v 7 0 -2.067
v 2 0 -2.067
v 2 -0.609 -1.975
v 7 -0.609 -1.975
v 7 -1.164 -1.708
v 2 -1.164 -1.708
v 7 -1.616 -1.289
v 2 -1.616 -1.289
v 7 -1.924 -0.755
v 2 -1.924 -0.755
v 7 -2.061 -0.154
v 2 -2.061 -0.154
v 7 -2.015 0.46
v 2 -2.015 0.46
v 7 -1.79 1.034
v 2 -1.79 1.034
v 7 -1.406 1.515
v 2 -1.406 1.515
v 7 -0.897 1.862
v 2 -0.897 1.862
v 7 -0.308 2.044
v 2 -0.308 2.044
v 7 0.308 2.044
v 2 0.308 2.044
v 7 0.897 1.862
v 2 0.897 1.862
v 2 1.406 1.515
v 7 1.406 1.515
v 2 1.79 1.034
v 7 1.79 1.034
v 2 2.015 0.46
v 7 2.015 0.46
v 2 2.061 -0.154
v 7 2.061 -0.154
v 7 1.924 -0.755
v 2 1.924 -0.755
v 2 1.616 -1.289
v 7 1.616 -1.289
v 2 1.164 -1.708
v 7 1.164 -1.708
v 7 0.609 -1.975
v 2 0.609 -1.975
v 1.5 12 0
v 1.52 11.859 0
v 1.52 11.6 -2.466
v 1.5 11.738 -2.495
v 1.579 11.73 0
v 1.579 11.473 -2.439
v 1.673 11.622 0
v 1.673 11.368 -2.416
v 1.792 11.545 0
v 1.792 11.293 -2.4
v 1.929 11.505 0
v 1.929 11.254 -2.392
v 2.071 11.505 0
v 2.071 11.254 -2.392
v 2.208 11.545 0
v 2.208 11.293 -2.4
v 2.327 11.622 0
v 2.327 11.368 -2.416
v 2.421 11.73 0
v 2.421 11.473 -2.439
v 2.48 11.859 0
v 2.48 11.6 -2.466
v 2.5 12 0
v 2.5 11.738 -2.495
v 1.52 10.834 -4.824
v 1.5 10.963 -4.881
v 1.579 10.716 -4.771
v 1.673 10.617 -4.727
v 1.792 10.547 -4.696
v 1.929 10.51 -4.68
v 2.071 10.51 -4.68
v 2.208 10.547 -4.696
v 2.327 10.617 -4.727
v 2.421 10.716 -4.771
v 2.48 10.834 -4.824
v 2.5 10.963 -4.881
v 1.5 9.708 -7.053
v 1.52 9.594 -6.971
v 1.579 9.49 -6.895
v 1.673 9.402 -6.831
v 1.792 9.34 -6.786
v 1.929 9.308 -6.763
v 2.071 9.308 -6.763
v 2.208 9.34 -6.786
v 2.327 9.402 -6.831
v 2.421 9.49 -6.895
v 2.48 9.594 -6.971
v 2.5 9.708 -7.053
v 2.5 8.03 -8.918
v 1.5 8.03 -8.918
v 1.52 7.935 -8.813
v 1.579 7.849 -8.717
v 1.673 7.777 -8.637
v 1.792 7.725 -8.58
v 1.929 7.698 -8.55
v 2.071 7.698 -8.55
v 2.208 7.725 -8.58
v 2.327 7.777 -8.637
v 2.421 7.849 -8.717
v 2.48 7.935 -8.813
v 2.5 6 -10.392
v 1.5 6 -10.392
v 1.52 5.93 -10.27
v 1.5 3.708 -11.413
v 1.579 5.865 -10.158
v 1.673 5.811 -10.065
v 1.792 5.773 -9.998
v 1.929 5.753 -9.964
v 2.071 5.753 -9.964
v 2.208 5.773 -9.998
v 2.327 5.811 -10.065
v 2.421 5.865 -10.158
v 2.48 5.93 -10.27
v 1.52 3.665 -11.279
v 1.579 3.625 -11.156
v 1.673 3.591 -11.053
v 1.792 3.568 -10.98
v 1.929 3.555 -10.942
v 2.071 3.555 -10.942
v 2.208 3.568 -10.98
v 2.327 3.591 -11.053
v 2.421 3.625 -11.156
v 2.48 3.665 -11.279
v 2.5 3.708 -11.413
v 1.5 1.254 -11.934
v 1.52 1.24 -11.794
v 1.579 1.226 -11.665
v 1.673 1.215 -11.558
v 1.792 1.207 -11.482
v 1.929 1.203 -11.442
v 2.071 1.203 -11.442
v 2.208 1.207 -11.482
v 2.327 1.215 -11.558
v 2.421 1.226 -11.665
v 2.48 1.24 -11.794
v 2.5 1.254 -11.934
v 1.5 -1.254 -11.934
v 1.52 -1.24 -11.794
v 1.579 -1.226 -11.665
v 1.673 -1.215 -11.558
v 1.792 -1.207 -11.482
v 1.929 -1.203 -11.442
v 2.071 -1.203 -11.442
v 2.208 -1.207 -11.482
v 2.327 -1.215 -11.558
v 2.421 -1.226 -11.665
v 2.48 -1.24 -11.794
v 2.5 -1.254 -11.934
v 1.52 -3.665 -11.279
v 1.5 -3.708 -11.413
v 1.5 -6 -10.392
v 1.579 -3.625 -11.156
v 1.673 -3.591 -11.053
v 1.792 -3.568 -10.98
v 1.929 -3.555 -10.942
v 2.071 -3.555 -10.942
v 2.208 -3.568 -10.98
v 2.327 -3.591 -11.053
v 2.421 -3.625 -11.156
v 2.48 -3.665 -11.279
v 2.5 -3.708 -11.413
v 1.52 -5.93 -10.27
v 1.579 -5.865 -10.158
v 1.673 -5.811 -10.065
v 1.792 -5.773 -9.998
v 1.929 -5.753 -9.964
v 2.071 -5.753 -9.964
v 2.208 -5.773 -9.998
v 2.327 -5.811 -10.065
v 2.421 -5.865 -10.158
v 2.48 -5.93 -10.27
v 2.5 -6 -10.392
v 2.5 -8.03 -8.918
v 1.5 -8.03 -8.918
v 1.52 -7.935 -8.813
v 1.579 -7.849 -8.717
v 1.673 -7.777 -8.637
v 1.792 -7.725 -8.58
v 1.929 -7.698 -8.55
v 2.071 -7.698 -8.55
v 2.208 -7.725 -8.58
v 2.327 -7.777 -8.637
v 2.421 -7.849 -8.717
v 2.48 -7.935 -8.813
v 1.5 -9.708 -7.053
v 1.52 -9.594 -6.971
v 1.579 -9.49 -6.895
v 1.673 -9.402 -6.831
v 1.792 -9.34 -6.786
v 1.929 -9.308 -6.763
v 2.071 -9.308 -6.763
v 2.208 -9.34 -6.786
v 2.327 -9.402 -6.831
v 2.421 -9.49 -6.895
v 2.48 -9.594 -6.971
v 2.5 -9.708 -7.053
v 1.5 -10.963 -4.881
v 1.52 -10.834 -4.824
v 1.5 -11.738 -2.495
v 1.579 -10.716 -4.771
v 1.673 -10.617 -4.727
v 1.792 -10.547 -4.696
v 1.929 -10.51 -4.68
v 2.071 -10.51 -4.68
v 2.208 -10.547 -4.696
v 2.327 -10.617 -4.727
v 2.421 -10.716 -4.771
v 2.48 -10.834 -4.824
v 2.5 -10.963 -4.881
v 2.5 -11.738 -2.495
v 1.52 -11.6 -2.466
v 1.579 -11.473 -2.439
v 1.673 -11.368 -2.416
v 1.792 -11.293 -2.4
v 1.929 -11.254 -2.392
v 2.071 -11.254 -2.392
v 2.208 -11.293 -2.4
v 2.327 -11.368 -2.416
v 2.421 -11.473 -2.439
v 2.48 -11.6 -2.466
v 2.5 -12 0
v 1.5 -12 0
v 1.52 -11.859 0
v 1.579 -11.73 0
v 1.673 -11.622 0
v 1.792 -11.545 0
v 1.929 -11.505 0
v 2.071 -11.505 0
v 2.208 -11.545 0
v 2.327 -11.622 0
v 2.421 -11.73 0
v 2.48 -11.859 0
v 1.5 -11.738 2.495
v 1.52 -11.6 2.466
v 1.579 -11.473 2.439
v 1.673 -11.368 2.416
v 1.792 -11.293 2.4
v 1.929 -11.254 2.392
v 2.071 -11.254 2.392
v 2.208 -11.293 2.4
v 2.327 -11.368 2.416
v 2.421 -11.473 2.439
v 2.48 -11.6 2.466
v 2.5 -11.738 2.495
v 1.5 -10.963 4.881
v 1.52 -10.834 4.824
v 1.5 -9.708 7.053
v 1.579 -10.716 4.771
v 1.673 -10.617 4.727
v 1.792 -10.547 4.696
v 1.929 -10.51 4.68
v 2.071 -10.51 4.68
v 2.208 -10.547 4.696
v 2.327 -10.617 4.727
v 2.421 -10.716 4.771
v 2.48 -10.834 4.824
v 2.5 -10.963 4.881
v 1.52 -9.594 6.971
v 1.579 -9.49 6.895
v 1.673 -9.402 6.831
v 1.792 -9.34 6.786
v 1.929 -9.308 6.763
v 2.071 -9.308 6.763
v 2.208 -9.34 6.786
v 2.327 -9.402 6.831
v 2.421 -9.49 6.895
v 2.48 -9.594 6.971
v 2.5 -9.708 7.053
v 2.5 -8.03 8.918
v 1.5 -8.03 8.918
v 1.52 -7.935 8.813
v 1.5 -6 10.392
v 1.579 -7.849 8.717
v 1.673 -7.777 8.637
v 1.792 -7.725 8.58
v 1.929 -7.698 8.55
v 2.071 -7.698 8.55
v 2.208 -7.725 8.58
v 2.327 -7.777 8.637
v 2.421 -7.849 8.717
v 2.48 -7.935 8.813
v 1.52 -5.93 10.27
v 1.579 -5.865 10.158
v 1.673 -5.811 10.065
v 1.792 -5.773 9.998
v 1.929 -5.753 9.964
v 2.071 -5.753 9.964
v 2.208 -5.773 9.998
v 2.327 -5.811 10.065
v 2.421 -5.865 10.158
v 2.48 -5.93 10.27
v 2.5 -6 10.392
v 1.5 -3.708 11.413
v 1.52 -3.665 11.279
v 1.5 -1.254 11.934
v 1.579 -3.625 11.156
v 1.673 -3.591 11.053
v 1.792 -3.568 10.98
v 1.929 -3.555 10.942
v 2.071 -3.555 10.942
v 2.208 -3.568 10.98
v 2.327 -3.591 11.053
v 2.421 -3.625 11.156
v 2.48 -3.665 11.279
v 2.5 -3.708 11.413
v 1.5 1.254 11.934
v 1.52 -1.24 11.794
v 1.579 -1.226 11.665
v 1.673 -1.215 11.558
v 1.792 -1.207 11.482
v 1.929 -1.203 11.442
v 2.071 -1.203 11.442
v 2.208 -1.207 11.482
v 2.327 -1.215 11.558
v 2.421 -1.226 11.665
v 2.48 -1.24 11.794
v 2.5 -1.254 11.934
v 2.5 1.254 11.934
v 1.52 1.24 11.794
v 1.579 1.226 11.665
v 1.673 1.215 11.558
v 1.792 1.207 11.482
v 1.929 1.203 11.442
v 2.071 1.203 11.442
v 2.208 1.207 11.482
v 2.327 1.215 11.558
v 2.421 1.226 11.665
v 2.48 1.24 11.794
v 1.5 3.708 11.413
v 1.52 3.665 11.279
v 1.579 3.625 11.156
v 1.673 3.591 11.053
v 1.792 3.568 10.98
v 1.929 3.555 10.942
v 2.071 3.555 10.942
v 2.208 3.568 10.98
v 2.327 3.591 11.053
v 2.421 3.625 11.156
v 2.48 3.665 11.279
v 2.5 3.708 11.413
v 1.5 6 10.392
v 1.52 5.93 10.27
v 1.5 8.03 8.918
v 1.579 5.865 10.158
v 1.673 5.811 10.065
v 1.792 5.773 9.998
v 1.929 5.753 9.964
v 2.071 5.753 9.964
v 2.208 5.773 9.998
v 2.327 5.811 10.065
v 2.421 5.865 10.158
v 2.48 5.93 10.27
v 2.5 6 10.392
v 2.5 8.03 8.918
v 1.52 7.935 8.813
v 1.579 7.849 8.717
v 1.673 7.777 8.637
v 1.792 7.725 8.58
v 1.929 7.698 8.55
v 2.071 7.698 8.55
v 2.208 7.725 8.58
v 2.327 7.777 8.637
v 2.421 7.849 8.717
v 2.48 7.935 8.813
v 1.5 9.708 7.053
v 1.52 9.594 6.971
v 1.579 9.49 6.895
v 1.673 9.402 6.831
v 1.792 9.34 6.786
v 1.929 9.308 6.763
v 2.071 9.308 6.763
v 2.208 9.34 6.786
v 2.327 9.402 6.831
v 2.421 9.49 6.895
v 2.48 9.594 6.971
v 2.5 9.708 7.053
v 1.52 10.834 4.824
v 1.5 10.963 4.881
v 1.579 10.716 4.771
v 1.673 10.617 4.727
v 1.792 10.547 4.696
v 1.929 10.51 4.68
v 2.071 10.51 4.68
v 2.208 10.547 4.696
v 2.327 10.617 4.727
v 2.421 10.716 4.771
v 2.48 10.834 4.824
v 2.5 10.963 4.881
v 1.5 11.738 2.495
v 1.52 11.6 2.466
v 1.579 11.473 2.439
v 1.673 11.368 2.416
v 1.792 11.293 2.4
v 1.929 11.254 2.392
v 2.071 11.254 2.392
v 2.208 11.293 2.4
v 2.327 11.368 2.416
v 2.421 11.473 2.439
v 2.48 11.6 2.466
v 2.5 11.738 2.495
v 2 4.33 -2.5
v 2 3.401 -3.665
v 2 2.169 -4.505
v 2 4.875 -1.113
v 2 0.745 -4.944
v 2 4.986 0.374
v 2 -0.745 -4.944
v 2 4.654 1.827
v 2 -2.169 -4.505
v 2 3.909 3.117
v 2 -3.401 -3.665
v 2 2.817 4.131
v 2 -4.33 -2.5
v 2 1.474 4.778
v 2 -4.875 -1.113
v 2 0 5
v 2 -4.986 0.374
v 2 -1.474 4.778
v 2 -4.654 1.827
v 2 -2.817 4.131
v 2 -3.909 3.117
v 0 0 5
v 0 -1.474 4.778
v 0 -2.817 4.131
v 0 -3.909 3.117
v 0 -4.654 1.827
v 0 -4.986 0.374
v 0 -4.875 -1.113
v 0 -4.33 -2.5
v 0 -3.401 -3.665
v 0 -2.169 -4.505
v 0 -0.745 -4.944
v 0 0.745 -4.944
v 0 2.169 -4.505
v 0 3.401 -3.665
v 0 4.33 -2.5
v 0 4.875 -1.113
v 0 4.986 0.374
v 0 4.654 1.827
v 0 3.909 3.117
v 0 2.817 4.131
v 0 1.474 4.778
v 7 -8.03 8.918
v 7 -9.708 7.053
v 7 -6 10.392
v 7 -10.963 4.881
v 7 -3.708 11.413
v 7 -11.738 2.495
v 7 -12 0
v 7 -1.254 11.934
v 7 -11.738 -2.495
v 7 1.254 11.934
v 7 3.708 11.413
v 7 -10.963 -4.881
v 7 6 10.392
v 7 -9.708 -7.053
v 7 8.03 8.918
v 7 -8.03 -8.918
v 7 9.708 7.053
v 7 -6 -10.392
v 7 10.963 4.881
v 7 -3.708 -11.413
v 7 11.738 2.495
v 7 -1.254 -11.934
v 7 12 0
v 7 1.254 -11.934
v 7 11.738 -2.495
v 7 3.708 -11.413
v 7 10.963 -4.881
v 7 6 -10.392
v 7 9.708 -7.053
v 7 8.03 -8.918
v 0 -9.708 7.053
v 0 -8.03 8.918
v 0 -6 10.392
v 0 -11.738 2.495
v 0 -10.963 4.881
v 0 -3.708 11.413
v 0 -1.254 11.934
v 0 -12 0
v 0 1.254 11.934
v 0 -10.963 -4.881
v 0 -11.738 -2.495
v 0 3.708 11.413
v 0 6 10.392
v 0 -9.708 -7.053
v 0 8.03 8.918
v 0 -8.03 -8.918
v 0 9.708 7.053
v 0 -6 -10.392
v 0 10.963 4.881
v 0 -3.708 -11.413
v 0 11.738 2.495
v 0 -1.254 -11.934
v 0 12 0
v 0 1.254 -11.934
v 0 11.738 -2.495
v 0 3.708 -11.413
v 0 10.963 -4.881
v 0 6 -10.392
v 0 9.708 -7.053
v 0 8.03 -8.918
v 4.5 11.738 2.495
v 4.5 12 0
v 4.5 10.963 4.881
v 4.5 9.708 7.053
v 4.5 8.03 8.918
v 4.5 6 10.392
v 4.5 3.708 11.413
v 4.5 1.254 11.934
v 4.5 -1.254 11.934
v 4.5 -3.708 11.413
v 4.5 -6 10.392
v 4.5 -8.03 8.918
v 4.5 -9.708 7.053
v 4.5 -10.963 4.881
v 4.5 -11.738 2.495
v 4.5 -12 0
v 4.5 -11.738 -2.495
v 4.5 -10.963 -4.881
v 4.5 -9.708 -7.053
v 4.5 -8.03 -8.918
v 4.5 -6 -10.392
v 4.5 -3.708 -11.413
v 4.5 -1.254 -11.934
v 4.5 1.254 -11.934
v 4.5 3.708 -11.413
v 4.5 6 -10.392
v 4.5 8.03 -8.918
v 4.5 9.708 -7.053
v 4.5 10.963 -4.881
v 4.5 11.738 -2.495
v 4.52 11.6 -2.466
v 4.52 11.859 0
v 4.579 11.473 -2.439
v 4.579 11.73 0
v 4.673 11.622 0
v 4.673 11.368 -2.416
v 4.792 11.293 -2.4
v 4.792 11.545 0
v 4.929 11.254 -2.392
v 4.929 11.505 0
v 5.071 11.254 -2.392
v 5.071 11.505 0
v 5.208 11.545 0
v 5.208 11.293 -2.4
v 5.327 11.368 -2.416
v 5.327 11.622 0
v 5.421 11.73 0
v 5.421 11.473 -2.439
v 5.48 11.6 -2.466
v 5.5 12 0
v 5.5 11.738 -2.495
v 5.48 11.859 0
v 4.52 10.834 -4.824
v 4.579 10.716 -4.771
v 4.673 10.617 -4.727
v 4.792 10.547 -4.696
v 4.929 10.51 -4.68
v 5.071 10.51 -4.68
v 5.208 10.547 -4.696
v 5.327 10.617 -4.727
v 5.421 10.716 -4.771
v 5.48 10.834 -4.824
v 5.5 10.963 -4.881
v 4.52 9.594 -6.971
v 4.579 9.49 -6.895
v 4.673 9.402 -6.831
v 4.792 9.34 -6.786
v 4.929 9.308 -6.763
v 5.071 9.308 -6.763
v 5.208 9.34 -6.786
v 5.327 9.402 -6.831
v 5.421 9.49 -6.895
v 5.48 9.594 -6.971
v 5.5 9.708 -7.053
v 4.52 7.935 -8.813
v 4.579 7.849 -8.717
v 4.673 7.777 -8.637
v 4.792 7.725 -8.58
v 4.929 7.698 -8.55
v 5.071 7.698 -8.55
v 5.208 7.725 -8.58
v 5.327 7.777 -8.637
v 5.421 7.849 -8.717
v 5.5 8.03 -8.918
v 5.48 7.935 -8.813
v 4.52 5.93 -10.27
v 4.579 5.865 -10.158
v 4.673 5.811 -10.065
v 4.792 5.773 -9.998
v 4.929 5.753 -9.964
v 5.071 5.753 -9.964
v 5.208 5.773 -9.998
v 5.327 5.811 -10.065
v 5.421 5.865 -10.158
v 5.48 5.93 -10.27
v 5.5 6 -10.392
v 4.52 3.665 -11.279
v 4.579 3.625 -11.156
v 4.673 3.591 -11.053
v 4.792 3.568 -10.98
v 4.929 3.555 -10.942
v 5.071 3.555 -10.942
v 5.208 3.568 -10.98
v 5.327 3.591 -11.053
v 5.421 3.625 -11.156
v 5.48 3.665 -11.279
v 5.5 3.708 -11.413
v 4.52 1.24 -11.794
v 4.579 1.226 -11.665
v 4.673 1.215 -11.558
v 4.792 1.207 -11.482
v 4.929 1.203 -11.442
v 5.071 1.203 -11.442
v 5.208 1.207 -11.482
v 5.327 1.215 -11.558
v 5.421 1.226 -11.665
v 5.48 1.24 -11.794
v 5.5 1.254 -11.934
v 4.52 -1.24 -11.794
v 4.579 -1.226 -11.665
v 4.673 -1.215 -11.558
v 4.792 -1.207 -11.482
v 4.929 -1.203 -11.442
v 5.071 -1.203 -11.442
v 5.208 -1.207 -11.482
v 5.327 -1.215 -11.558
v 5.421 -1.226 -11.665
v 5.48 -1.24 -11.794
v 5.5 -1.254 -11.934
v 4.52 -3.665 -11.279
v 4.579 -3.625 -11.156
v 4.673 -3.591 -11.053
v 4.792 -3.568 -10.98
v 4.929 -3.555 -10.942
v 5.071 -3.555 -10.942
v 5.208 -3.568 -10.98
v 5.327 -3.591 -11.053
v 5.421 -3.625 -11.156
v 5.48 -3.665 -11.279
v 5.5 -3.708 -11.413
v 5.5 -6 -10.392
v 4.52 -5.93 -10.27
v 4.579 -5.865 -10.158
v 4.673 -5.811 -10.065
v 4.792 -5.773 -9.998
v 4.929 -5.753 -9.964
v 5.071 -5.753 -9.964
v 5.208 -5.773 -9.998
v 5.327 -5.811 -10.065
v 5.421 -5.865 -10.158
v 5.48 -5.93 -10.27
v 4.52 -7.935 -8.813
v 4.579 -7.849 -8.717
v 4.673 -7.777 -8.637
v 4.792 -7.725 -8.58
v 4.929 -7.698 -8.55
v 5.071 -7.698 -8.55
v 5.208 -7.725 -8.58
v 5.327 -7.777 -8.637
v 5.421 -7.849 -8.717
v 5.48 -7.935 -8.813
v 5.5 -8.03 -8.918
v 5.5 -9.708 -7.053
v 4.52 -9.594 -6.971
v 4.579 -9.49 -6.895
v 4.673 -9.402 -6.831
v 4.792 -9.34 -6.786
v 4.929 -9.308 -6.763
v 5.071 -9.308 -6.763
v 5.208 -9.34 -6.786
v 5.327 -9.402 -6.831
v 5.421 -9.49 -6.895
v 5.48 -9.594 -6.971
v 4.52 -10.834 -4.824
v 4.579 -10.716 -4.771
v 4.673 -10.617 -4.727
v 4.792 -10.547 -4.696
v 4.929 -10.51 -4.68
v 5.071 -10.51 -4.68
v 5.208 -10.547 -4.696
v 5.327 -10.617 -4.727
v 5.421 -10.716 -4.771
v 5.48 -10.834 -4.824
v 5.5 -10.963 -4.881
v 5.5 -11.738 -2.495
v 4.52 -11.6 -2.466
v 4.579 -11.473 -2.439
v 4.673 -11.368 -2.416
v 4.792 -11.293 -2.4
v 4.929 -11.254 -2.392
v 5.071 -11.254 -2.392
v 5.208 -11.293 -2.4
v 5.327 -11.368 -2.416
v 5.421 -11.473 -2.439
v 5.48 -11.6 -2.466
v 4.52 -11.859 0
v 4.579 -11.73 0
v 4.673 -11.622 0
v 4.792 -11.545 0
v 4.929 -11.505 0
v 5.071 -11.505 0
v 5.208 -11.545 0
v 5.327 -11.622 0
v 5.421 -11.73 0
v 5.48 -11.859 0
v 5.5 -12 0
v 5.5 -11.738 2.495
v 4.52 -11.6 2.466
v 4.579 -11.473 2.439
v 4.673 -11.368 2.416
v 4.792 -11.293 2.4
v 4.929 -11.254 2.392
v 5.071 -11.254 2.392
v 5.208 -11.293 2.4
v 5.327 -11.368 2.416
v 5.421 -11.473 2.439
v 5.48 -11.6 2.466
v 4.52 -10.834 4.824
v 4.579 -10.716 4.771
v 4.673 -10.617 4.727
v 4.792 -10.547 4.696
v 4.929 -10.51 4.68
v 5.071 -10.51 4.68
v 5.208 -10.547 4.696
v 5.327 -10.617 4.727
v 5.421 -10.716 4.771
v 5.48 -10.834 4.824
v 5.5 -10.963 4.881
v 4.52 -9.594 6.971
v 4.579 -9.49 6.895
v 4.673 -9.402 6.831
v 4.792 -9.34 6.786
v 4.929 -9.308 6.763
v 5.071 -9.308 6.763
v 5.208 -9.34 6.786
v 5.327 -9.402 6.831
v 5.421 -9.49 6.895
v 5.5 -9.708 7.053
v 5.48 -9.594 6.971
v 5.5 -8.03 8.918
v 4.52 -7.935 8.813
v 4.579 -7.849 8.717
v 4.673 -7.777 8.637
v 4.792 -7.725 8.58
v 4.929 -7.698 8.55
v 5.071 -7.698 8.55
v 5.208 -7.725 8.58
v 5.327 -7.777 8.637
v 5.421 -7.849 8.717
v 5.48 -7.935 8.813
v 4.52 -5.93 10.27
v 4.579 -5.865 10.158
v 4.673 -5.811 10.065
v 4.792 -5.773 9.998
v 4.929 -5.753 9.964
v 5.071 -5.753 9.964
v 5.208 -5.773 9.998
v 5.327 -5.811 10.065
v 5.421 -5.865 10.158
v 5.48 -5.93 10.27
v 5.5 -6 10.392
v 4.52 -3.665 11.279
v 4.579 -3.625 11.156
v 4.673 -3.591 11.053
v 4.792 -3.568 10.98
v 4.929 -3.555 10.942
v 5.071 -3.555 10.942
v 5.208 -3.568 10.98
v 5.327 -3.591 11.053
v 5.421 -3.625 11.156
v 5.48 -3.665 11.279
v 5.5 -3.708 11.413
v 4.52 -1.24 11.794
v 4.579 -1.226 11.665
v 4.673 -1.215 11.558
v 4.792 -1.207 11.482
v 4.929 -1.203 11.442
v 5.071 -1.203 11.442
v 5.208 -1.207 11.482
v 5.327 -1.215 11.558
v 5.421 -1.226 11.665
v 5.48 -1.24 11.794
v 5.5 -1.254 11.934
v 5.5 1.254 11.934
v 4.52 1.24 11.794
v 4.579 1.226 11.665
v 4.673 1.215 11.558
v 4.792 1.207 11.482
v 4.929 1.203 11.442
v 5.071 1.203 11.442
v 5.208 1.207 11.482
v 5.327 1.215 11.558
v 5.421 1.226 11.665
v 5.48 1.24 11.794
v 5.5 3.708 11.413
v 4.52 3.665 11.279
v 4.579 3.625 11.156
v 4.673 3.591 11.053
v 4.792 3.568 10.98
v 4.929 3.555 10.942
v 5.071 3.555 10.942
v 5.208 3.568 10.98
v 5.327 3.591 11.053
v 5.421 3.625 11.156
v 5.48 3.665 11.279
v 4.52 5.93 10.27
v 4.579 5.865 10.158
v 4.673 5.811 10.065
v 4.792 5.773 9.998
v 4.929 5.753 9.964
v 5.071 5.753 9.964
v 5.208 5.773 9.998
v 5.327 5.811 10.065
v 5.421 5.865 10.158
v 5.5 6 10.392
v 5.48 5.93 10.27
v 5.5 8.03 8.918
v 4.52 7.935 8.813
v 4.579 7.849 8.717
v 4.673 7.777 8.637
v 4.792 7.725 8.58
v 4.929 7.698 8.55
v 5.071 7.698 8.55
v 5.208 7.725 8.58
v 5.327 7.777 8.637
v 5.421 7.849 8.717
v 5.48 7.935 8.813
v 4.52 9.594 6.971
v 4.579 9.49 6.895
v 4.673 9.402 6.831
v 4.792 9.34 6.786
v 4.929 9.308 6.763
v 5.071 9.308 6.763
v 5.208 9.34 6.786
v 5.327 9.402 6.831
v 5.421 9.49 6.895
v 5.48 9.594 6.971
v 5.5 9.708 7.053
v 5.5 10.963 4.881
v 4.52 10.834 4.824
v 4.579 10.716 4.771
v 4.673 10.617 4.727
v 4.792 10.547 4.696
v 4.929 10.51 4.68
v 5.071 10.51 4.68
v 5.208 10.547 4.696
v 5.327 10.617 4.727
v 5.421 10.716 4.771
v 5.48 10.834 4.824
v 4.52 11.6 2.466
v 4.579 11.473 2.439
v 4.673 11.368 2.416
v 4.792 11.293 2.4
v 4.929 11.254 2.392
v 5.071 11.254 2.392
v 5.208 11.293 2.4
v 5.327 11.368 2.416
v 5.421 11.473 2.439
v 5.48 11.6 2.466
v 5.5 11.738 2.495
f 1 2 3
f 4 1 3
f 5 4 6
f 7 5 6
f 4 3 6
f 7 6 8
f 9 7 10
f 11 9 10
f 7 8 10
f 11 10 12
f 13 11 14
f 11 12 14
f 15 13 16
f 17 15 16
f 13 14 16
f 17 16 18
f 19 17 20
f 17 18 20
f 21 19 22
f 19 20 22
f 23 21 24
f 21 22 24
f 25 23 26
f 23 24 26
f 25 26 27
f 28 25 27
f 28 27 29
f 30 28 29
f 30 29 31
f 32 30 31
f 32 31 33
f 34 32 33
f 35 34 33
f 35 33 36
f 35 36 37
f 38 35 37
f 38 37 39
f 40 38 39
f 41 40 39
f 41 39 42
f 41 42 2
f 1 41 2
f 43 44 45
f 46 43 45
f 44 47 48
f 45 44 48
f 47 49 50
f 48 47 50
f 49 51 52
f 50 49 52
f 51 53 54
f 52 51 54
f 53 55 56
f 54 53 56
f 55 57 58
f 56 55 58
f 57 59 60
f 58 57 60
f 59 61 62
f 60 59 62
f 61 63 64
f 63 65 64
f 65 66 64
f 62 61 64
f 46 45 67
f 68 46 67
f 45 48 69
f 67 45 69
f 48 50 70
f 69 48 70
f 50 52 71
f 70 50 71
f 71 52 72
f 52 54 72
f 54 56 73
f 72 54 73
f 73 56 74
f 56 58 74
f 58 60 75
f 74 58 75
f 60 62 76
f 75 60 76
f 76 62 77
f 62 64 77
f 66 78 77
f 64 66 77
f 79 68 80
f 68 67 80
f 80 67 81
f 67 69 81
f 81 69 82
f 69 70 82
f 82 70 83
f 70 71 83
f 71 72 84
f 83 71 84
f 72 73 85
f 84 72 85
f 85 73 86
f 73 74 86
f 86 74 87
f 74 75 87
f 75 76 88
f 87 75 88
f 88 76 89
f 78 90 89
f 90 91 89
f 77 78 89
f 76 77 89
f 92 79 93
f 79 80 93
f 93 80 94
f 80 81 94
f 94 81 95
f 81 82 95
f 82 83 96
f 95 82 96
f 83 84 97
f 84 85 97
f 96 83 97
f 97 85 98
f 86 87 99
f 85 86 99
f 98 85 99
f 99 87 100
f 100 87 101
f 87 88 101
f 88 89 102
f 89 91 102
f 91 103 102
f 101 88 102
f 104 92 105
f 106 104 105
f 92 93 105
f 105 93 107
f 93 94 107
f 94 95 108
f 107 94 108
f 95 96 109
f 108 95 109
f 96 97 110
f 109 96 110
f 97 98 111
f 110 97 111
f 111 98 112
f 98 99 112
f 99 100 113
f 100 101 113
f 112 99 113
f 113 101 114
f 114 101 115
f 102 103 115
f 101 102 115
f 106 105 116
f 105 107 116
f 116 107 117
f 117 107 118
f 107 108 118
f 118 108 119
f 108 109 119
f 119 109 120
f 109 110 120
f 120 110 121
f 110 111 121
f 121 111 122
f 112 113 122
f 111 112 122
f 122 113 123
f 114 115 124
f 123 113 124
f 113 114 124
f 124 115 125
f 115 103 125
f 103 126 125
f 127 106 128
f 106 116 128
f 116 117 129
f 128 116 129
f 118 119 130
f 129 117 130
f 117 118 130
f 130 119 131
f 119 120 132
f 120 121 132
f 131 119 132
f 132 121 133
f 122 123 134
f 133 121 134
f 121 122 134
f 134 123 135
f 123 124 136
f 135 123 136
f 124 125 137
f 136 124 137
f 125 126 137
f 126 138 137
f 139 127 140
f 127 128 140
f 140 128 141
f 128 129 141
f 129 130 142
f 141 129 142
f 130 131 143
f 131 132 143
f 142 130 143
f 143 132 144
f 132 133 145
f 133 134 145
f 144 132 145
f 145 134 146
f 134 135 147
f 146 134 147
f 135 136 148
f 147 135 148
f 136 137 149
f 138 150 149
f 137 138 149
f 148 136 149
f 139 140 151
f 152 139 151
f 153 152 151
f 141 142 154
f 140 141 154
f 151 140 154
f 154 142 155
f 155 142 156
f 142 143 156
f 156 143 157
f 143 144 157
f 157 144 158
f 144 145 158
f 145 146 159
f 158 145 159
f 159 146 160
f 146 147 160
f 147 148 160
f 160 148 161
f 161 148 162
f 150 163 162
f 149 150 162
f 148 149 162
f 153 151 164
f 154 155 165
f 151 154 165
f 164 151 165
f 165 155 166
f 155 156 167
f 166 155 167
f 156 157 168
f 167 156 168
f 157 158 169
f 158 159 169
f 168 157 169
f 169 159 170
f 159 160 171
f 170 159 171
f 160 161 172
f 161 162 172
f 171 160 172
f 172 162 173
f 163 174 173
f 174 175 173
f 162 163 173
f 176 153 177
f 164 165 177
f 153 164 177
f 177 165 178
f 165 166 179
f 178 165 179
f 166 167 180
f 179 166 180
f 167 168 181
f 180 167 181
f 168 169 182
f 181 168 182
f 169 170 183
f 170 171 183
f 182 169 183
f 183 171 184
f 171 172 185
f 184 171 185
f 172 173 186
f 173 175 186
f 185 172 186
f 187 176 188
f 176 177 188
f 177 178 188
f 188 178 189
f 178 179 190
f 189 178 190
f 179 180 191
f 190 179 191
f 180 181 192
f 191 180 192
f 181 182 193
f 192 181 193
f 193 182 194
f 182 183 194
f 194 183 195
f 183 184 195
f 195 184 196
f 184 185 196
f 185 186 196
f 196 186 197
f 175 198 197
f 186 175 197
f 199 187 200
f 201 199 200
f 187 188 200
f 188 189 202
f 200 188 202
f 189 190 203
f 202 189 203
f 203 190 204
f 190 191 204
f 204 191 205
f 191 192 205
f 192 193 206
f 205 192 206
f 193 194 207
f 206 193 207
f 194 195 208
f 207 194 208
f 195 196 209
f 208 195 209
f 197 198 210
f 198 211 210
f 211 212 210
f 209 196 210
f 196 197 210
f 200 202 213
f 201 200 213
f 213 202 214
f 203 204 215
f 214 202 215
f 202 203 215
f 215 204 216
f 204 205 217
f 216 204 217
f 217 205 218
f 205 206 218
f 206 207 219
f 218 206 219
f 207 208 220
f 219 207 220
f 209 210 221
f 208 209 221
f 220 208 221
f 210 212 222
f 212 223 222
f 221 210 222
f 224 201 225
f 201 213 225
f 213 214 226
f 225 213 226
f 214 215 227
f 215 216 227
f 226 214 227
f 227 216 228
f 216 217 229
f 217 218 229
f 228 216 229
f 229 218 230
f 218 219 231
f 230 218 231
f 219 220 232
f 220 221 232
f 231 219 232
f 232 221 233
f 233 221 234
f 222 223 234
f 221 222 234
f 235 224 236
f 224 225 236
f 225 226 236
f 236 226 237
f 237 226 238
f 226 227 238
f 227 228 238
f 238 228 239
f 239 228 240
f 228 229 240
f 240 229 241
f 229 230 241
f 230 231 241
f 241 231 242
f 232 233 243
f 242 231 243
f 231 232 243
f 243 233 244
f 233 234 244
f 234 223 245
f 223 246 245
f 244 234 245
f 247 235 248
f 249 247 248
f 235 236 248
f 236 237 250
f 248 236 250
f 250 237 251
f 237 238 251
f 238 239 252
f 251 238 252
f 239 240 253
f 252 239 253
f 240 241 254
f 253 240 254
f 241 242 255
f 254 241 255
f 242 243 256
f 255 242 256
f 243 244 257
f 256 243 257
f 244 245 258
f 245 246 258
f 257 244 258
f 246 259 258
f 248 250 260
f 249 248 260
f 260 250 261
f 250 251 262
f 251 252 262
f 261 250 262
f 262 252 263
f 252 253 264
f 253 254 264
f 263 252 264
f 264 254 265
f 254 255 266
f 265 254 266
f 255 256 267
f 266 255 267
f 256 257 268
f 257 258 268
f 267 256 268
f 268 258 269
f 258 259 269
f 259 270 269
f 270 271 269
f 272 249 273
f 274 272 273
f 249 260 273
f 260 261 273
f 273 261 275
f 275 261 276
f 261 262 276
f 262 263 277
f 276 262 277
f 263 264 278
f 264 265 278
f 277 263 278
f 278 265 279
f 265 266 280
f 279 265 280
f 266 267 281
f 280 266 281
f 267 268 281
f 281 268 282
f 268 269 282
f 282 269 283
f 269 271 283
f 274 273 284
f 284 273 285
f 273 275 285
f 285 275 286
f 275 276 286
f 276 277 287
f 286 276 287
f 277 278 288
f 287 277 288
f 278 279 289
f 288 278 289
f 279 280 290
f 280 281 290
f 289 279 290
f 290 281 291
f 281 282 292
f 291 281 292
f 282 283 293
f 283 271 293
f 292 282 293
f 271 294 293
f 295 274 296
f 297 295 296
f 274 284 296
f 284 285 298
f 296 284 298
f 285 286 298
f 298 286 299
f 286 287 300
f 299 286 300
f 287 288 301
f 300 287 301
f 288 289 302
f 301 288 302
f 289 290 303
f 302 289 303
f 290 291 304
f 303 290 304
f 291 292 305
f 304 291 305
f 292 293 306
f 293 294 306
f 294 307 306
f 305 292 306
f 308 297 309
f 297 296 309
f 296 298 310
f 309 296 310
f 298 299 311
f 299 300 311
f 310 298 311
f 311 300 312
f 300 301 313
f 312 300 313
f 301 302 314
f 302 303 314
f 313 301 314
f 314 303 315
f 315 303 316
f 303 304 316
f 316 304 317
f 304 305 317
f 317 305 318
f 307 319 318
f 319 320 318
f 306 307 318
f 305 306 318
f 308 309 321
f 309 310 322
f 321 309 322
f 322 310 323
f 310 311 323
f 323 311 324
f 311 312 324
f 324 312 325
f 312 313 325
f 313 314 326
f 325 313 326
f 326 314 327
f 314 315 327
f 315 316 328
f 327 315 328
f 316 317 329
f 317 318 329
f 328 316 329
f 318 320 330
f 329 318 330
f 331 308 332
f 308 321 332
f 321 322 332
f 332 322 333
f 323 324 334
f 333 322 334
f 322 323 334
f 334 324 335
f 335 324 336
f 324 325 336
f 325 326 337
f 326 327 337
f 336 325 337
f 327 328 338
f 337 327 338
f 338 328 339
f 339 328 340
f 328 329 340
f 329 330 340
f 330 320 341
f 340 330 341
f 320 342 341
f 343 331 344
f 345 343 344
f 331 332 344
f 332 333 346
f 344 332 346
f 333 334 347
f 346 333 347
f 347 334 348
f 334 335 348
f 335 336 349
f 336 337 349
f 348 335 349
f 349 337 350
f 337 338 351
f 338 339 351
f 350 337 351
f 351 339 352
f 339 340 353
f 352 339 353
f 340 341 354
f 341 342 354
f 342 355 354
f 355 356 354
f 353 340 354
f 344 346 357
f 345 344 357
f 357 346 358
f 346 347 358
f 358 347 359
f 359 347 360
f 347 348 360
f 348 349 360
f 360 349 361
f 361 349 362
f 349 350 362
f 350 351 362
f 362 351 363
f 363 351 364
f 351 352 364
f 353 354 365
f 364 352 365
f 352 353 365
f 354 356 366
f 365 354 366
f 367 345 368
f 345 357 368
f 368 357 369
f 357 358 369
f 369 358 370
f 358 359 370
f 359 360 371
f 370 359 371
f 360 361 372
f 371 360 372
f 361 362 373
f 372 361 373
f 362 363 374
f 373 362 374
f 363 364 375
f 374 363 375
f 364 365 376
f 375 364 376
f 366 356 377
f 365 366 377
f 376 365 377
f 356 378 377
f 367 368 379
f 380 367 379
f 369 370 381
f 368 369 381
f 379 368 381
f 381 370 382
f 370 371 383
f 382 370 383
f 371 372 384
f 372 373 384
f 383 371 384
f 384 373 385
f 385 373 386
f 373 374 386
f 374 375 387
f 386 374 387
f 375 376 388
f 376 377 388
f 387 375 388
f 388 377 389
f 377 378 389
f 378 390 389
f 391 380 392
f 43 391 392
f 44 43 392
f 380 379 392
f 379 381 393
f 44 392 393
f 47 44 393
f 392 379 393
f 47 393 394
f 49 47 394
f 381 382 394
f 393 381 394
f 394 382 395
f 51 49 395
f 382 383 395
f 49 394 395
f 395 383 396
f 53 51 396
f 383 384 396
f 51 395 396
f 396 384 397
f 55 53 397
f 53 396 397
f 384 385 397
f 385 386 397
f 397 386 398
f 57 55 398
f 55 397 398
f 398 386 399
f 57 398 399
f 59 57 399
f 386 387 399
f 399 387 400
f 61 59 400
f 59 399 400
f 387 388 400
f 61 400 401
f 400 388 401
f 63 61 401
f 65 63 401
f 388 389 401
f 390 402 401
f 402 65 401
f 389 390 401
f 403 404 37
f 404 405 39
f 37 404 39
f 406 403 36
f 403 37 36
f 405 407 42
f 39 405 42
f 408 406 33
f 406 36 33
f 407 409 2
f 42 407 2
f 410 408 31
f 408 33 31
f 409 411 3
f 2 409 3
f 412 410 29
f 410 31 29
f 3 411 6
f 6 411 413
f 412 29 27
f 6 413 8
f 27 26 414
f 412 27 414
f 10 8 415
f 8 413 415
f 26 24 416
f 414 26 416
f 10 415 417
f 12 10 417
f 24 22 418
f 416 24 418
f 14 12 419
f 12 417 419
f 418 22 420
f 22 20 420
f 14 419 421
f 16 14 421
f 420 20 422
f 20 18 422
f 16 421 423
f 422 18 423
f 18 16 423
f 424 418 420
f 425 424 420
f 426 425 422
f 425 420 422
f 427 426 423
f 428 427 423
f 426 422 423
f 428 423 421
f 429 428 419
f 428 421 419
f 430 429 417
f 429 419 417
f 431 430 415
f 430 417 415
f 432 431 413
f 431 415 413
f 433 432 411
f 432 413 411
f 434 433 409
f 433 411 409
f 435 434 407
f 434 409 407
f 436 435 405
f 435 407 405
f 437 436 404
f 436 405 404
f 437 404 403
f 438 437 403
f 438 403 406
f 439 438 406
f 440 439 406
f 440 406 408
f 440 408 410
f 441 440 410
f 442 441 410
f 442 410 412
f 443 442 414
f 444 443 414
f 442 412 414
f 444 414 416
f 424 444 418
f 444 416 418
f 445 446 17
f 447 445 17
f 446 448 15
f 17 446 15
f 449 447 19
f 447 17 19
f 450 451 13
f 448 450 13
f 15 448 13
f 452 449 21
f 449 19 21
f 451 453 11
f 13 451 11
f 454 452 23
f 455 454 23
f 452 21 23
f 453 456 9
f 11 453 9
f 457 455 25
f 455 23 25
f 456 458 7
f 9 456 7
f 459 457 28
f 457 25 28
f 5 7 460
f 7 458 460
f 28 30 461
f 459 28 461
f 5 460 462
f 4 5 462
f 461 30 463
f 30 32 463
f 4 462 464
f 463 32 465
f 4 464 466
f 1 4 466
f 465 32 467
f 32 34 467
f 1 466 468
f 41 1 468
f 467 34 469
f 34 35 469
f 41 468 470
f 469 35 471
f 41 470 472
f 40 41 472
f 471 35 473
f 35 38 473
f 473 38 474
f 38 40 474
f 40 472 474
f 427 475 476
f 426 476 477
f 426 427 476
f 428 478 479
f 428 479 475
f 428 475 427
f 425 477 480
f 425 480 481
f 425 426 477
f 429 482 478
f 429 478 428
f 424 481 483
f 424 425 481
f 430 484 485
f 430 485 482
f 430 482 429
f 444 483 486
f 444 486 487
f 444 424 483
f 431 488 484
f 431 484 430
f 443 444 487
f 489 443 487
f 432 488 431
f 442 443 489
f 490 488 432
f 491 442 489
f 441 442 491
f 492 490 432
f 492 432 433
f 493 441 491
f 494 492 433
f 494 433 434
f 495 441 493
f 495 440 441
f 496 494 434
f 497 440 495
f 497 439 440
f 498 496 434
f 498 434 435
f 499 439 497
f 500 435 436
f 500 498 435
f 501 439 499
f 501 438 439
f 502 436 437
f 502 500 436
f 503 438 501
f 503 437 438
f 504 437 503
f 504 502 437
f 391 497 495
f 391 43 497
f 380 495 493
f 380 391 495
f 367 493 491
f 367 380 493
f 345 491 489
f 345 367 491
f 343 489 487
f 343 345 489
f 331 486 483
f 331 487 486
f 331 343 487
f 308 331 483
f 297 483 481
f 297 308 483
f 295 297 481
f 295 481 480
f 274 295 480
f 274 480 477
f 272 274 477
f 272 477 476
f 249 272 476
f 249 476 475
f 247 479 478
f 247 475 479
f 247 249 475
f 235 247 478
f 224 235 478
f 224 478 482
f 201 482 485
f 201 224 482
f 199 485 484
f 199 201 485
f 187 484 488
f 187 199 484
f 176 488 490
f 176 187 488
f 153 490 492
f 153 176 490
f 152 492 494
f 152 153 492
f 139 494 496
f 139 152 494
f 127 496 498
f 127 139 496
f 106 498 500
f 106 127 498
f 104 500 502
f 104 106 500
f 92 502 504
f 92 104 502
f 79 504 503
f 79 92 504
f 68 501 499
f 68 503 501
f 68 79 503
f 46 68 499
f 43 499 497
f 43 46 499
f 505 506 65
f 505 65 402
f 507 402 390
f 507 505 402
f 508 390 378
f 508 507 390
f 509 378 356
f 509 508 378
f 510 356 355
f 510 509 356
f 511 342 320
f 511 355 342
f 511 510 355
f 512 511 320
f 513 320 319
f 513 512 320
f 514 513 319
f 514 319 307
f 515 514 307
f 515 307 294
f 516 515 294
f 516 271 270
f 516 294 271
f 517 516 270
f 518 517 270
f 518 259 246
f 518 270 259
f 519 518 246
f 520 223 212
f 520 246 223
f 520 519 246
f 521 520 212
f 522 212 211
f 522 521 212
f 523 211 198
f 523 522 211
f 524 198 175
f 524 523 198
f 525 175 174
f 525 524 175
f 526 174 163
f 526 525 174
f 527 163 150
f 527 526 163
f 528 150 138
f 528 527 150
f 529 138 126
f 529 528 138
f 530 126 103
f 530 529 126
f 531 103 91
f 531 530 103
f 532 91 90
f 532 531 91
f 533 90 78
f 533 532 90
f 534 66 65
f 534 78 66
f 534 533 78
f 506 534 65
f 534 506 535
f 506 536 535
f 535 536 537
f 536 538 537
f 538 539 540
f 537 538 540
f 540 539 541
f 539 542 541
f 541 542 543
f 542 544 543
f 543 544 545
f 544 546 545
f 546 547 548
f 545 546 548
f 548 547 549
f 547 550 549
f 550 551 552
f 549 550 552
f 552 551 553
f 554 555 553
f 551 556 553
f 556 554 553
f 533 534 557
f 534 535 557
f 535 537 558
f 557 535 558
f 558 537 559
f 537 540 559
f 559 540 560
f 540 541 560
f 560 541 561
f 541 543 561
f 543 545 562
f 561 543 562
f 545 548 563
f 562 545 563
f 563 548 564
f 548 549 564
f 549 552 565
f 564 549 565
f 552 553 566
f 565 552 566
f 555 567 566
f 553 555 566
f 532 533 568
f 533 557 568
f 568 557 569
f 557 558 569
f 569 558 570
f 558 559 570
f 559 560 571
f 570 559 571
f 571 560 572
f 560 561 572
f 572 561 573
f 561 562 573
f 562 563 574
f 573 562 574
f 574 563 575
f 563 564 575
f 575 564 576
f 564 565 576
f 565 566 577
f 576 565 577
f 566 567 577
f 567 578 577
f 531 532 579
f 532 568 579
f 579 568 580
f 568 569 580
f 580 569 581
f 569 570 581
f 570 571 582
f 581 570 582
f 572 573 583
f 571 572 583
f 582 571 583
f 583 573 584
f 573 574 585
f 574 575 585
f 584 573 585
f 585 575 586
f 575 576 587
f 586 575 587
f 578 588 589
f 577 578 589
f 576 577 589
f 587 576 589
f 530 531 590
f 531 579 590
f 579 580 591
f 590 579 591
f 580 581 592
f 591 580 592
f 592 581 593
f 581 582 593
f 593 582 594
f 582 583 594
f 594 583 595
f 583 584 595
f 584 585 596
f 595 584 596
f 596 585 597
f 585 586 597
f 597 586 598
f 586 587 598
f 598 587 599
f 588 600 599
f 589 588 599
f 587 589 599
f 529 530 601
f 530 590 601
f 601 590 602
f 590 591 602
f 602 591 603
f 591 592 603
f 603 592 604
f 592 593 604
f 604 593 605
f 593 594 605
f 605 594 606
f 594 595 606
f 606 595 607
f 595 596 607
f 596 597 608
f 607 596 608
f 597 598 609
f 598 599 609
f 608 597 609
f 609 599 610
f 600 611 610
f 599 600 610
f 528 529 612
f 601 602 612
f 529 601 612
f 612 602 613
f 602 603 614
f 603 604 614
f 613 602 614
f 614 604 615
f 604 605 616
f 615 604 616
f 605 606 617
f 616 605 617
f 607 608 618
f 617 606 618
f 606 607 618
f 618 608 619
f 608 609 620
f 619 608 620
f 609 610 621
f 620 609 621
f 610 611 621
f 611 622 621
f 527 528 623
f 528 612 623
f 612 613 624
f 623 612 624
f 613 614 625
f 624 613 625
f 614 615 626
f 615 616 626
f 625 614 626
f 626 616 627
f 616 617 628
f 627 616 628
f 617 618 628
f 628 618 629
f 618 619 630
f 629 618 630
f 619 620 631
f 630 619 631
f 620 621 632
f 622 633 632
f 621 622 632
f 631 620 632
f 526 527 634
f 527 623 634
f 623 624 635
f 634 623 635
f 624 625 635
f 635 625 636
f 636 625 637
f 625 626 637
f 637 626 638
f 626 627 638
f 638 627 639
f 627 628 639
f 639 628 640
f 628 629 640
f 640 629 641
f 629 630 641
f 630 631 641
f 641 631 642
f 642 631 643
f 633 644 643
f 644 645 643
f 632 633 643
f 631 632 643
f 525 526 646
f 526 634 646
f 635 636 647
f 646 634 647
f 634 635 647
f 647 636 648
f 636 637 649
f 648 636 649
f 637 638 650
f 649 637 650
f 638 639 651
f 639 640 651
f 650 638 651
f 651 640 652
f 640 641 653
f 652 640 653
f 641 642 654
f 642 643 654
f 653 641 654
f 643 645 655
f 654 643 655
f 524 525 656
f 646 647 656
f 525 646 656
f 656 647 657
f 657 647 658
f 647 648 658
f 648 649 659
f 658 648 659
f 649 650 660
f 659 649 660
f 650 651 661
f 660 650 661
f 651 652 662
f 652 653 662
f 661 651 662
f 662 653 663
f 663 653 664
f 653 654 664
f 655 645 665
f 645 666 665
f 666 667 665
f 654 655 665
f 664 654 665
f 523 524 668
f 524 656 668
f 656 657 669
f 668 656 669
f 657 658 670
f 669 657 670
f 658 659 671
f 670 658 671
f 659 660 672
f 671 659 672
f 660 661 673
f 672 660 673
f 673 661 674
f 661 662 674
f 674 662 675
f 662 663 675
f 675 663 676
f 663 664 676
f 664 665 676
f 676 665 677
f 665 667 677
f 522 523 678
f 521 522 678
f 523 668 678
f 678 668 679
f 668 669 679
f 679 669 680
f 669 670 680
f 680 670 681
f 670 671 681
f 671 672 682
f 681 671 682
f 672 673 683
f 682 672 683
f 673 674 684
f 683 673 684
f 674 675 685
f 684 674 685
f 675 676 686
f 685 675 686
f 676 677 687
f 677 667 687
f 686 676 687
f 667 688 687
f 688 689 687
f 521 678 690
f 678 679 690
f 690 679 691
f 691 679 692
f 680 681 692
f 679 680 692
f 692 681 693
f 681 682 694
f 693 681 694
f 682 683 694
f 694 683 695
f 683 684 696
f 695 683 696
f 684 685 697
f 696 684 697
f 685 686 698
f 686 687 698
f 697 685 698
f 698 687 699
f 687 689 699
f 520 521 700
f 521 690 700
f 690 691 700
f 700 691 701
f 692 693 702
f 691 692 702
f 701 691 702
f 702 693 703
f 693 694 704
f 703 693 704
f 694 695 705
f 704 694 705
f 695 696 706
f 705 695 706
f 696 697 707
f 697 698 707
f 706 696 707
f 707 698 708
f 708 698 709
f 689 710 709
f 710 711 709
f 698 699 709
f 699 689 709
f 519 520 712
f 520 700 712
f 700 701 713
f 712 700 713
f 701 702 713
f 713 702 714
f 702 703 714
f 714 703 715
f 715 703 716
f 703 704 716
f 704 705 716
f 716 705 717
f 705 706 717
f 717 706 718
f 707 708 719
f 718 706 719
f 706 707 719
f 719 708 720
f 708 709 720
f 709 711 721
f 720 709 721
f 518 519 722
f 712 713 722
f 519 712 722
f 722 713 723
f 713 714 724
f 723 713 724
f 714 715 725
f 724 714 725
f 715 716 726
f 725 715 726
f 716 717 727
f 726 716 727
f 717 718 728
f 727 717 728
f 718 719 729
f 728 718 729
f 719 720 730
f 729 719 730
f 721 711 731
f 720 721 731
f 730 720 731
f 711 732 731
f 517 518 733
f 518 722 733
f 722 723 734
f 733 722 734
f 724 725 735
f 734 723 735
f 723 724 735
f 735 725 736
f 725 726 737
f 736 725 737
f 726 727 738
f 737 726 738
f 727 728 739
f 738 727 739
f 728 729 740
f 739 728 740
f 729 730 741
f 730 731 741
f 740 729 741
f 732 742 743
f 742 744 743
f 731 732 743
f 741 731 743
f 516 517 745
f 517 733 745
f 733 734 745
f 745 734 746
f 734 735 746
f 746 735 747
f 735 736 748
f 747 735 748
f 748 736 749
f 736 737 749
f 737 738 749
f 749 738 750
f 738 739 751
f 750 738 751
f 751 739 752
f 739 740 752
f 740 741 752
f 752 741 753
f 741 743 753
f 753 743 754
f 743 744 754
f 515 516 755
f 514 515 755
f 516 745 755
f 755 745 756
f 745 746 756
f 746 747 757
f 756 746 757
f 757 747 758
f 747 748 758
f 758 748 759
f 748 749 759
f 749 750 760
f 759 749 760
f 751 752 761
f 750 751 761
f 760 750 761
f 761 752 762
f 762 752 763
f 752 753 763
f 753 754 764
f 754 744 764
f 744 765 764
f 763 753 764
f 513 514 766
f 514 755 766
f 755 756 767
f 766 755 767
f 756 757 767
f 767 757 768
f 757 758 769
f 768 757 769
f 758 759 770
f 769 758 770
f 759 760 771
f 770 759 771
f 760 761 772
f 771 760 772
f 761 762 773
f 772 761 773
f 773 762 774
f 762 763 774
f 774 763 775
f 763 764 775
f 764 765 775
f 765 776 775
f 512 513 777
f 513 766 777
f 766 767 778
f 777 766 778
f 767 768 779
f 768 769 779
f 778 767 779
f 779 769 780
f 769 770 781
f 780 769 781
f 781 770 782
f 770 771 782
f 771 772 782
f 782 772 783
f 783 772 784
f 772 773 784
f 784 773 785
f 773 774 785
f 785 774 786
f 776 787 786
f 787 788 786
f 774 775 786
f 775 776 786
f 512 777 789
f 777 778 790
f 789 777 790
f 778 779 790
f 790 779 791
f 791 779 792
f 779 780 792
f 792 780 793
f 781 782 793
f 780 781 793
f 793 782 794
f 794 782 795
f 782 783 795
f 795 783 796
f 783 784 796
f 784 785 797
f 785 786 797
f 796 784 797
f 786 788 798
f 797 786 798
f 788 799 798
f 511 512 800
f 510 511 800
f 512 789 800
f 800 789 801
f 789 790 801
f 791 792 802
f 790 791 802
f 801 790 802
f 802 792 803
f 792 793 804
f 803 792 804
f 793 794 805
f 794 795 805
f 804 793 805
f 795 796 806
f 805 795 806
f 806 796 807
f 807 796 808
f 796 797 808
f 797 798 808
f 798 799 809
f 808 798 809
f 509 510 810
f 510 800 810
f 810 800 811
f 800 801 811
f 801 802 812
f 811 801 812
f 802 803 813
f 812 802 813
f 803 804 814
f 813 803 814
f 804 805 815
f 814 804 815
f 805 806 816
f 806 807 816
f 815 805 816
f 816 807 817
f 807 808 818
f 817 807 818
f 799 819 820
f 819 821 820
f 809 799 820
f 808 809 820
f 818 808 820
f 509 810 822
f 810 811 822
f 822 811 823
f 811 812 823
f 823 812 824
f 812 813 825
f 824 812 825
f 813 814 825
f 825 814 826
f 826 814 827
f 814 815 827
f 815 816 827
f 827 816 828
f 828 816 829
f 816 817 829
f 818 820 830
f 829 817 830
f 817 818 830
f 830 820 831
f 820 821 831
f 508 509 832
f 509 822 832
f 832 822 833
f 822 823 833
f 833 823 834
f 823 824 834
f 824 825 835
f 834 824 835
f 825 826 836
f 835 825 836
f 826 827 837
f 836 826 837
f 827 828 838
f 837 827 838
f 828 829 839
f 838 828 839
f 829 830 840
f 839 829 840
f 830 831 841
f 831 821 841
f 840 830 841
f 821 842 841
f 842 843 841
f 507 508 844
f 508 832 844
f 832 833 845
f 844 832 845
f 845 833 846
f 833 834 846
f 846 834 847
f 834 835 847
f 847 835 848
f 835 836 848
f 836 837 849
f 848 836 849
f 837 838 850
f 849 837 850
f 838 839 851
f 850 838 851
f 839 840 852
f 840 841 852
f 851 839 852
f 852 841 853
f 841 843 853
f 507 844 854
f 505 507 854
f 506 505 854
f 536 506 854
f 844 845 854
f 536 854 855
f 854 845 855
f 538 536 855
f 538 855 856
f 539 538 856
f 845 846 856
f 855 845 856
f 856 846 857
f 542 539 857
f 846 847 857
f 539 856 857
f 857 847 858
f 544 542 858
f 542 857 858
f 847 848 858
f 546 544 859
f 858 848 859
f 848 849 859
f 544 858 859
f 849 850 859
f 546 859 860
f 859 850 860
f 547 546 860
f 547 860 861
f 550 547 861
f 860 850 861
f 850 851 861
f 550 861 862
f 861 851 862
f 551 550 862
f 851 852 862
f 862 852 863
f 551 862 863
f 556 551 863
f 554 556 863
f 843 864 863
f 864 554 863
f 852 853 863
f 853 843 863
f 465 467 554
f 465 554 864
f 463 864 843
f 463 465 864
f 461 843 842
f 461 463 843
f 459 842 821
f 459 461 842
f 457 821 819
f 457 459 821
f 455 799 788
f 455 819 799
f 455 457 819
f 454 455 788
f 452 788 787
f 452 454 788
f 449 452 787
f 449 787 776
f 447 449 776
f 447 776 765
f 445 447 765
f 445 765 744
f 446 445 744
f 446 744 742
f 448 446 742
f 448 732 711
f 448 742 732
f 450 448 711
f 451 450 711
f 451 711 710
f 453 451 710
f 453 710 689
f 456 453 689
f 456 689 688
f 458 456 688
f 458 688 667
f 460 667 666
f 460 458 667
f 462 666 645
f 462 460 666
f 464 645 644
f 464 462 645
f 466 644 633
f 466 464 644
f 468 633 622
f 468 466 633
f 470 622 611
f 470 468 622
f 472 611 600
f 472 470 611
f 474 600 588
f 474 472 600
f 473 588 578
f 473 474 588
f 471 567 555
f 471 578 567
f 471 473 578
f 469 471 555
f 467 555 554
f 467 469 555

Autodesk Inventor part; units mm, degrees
ref_plane "YZ Plane" through (0, 0, 0) normal (1, 0, 0) x (0, 1, 0)
ref_plane "XZ Plane" through (0, 0, 0) normal (0, 1, 0) x (-1, 0, 0)
ref_plane "XY Plane" through (0, 0, 0) normal (0, 0, 1) x (1, 0, 0)
sketch "Sketch1" plane through (0, 0, 0) normal (0, 0, 1) x (1, 0, 0)
  line L0 (0, 0) -> (0, 12)
  line L1 (0, 12) -> (1.5, 12)
  line L2 (1.5, 12) -> (1.5, 12)
  line L3 (2.5, 12) -> (2.5, 12)
  line L4 (2.5, 12) -> (4.5, 12)
  line L5 (4.5, 12) -> (4.5, 12)
  line L6 (5.5, 12) -> (5.5, 12)
  line L7 (5.5, 12) -> (7, 12)
  line L8 (7, 12) -> (7, 0)
  line L9 (7, 0) -> (0, 0)
  arc A0 (1.5, 12) -> (2.5, 12) centre (2, 12) ccw
  arc A1 (4.5, 12) -> (5.5, 12) centre (5, 12) ccw
  point P0 (0.75, 12)
  dimension "d0" = 7
  dimension "d2" = 0.5
  dimension "d3" = 0.5
  dimension "d4" = 2
  dimension "d5" = 2
  dimension "d6" = 24
revolve "Revolution1" add sketch "Sketch1" angle 360 about axis through (7, 0, 0) along (-1, 0, 0)
sketch "Sketch2" plane through (0, 0, 0) normal (-1, 0, 0) x (0, 0, 1)
  circle A0 centre (0, 0) radius 12 projected
  point P0 (0, 0)
hole "Hole1" at (0, 0, 0) direction (1, 0, 0) diameter 10 depth 2
sketch "Sketch3" plane through (7, 0, 0) normal (1, 0, 0) x (0, 0, -1)
  circle A0 centre (0, 0) radius 12 projected
hole "Hole2" at (7, 0, 0) direction (-1, 0, 0) diameter 4.134 depth 5 thread size "M5x0.8" class "6H" standard "ISO Metric profile"
equation "\"d5\" = d4"
properties part number "40"
